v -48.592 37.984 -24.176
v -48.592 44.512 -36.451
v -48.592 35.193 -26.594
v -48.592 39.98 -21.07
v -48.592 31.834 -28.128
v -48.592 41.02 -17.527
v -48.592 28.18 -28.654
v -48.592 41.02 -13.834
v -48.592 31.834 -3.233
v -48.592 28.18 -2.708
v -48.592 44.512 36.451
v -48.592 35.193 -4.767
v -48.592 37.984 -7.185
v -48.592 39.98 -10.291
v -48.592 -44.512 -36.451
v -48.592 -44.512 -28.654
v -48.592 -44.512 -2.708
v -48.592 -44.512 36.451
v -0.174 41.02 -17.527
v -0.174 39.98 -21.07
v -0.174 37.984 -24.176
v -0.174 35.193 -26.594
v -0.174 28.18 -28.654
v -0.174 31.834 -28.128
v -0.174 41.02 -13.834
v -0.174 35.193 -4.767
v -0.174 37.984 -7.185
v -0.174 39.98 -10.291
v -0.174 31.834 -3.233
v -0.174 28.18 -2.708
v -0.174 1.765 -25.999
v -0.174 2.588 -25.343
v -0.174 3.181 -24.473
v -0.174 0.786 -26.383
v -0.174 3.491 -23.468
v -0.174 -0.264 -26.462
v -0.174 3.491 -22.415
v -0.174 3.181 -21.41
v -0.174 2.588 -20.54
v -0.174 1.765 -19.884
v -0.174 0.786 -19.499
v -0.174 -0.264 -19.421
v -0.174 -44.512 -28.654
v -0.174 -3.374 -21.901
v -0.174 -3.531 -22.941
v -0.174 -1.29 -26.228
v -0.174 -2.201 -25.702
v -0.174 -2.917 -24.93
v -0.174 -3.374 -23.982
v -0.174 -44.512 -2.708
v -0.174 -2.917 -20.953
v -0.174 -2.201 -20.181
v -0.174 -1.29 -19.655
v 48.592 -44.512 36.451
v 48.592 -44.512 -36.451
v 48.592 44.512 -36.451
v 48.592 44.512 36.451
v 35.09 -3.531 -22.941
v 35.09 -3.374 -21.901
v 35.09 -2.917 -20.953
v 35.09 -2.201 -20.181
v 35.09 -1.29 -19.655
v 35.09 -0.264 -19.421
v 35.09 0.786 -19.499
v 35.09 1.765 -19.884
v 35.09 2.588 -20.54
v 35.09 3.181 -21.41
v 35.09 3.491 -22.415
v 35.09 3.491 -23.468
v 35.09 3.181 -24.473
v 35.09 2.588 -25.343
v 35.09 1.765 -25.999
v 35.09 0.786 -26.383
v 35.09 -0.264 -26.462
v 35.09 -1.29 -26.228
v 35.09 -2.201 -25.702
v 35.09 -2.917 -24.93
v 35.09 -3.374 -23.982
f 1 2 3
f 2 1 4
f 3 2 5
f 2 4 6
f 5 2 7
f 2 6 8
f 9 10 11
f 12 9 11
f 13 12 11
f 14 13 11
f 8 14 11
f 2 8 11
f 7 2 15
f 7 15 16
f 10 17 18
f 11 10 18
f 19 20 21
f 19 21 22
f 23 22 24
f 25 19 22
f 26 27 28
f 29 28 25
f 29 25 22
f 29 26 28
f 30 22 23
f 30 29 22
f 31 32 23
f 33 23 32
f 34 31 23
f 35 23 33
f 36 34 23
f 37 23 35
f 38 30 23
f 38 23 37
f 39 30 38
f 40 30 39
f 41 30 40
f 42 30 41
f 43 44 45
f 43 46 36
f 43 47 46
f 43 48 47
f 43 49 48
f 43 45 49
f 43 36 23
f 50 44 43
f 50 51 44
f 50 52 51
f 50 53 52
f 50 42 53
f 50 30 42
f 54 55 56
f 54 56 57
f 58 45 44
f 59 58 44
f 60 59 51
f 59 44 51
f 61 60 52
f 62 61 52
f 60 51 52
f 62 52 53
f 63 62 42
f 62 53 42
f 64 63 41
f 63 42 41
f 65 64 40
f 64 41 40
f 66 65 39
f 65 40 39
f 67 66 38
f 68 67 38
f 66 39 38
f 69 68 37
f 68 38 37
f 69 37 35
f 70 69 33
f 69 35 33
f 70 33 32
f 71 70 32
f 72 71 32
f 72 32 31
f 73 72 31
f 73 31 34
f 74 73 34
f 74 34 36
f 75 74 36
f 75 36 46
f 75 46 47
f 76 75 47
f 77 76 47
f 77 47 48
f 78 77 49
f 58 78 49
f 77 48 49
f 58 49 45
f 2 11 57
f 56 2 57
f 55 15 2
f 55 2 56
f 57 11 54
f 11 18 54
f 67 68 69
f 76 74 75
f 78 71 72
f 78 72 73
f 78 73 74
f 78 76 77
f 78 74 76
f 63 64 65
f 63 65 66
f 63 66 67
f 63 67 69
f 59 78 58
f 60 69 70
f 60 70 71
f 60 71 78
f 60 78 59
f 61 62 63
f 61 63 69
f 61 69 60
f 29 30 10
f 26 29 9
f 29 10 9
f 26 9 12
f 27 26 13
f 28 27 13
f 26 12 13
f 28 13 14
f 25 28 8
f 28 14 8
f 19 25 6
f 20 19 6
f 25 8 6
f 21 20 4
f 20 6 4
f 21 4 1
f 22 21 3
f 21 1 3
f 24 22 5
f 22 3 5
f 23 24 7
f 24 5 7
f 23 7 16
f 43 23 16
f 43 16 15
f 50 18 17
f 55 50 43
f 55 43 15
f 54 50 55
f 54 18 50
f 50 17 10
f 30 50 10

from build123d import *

# Parameters (mm, degrees)
F0_W     = 97.184672
F0_H     = 72.901874
F1_DEPTH = 44.5124
F3_DEPTH = 48.41849
F4_R     = 3.530572
F5_DEPTH = 35.26357


with BuildPart() as f1:
    # F0 (on Front) → F1 (new body, symmetric)
    with BuildSketch(Plane.XZ):
        Rectangle(F0_W, F0_H)
    extrude(amount=F1_DEPTH, both=True)

    # F2 (on face) → F3 (cut)
    with BuildSketch(Plane(origin=(-48.592336, 0, 0), x_dir=(0, -1, 0), z_dir=(-1, 0, 0))):
        with BuildLine():
            Line((44.5124, -2.707677), (-28.179571, -2.707677))
            ThreePointArc((-28.179571, -2.707677), (-41.152528, -15.680633), (-28.179571, -28.653589))
            Line((-28.179571, -28.653589), (44.5124, -28.653589))
            Line((44.5124, -28.653589), (44.5124, -2.707677))
        make_face()
    extrude(amount=-F3_DEPTH, mode=Mode.SUBTRACT)

    # F4 (on face) → F5 (cut)
    with BuildSketch(Plane(origin=(-0.173846, 0, 0), x_dir=(0, -1, 0), z_dir=(-1, 0, 0))):
        with Locations((0, -22.941379)):
            Circle(F4_R)
    extrude(amount=-F5_DEPTH, mode=Mode.SUBTRACT)


solid = f1.part
